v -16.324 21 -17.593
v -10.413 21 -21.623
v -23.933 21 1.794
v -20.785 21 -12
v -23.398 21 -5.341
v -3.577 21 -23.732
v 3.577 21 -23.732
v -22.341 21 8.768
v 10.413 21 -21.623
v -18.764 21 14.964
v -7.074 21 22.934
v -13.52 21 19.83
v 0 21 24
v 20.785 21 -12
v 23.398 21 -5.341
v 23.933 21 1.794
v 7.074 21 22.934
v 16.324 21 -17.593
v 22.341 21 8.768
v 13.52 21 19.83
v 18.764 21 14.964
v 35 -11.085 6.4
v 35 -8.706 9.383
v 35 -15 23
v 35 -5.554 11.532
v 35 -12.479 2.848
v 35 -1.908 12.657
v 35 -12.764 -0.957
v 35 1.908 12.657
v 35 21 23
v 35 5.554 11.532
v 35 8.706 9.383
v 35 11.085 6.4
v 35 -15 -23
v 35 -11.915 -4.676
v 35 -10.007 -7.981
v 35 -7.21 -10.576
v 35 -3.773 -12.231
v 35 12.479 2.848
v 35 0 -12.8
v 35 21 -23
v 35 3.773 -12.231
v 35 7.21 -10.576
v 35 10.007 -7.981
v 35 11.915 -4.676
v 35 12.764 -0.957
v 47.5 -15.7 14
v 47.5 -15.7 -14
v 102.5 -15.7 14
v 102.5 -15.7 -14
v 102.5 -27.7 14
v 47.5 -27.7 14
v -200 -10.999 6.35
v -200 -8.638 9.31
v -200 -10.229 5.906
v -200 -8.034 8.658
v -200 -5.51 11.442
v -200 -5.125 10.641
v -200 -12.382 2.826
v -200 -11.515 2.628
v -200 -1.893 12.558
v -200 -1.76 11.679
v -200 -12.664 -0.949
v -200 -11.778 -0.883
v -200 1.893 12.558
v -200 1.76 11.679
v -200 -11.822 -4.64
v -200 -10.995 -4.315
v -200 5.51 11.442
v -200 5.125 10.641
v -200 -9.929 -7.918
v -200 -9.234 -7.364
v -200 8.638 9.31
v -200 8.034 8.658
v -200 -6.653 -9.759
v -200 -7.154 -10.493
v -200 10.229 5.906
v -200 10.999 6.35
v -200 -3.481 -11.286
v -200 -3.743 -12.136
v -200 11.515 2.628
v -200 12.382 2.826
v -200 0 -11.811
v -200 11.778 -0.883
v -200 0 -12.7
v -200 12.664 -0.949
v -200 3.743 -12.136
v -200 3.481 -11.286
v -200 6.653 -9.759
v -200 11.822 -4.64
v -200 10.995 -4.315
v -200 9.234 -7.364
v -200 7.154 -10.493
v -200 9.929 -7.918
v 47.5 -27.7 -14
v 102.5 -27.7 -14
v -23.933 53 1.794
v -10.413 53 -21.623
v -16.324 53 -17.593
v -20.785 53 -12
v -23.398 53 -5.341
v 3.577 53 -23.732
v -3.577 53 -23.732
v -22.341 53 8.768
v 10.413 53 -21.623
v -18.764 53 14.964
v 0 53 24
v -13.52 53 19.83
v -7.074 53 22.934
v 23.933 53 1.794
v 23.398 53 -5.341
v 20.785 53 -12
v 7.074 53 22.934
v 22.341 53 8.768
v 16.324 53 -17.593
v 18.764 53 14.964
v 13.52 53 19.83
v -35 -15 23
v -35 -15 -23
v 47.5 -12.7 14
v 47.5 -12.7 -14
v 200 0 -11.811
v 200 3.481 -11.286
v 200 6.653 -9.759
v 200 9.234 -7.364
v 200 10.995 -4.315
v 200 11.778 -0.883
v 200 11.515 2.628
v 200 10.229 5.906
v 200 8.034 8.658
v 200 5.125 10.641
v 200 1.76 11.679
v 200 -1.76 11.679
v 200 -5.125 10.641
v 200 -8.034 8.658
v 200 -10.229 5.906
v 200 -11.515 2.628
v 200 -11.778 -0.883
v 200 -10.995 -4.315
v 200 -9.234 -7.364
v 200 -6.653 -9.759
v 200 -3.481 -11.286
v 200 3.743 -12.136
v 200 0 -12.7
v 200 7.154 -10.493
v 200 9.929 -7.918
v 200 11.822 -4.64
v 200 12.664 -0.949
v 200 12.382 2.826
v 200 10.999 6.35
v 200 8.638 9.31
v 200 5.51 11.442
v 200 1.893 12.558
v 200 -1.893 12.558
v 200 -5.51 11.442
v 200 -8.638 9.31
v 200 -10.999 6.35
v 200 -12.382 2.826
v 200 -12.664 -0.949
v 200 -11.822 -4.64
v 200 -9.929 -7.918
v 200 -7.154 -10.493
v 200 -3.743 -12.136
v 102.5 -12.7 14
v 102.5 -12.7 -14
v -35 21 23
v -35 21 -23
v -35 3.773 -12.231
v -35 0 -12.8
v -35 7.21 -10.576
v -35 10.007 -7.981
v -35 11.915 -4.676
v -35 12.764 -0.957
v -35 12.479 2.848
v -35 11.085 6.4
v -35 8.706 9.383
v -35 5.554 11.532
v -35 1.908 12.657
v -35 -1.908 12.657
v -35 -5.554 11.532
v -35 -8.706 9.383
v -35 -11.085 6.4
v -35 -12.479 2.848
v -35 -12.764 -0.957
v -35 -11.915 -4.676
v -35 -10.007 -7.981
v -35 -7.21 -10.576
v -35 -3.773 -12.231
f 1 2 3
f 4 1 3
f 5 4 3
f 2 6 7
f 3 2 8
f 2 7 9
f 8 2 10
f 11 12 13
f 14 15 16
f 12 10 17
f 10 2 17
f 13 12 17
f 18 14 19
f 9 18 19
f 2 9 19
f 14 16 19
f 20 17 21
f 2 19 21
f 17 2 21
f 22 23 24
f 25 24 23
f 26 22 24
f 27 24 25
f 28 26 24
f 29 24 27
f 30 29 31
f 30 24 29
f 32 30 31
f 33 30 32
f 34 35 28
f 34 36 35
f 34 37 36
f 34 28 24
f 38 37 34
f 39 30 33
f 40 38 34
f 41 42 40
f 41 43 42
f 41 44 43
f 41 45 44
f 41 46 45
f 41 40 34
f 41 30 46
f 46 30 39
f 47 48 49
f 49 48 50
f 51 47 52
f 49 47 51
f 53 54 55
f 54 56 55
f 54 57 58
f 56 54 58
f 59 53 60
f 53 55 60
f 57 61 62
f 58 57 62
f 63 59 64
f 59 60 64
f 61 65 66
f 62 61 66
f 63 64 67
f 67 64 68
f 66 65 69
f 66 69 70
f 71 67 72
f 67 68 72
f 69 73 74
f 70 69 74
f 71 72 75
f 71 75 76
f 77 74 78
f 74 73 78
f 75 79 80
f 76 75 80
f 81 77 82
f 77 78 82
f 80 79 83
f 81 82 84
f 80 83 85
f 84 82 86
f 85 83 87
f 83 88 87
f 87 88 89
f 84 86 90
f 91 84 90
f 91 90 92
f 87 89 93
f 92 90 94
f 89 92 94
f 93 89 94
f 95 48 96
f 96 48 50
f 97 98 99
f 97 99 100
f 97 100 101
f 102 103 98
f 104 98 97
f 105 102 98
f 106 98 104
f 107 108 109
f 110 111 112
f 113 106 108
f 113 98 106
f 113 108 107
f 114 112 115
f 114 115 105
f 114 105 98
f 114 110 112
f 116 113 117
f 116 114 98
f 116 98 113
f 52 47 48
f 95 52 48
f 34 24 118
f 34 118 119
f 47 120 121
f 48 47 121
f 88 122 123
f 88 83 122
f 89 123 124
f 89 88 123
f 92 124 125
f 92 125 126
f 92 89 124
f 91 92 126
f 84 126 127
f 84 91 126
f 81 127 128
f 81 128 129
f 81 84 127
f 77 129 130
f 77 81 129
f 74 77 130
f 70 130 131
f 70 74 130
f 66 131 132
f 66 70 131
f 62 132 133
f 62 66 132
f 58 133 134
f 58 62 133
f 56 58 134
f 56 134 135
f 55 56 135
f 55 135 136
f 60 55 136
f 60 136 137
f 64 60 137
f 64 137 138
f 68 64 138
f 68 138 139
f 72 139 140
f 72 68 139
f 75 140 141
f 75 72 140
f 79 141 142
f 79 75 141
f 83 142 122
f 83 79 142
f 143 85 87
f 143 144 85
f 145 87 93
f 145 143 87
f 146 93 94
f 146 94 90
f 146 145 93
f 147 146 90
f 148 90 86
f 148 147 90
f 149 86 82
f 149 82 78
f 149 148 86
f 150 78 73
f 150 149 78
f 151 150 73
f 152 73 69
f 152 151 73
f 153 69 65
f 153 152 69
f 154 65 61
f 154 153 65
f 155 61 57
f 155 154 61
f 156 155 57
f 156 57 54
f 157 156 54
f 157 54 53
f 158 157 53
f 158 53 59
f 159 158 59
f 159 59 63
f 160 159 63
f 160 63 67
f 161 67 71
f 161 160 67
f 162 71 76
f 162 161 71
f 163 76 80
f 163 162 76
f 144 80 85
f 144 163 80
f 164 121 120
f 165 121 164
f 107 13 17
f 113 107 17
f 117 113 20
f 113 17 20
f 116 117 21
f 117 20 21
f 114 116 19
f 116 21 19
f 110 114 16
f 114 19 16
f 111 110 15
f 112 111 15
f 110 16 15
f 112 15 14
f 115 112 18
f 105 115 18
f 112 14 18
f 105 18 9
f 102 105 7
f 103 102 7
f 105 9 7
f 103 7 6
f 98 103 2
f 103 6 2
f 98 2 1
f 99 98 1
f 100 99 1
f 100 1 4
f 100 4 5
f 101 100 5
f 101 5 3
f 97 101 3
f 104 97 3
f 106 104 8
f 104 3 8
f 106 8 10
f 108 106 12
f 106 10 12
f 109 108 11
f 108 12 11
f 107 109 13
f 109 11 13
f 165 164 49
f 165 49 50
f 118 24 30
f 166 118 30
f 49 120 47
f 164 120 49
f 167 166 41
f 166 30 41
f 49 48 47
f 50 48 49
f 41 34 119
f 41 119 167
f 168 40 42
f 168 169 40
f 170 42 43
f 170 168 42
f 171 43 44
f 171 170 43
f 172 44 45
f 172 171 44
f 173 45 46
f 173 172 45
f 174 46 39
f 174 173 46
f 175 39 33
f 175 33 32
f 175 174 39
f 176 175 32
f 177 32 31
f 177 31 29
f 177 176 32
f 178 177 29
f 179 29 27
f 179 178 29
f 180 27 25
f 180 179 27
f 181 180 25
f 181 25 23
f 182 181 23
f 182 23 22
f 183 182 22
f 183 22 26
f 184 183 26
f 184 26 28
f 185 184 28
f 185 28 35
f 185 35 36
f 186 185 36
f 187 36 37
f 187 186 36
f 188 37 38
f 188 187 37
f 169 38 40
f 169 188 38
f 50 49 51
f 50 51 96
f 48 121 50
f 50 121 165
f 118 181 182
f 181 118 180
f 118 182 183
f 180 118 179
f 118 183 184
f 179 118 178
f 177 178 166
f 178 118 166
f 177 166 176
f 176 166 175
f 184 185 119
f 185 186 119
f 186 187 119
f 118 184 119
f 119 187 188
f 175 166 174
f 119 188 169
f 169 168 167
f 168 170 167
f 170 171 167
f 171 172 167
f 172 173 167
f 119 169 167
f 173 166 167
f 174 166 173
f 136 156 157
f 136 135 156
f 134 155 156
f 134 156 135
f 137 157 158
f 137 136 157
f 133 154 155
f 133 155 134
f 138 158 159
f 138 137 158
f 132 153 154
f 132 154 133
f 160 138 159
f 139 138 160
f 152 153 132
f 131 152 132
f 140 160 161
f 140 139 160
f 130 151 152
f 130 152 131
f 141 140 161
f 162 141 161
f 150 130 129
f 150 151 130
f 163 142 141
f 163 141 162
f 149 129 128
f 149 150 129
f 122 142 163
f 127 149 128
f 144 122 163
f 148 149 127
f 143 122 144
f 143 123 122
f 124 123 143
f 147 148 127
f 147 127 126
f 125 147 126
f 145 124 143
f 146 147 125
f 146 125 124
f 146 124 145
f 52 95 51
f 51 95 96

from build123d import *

# Parameters (mm, degrees)
SKETCH1_R   = 12.7
SKETCH1_R_2 = 11.811
BOOM_DEPTH  = 200
SKETCH2_W   = 46
SKETCH2_H   = 36
SKETCH2_R   = 12.8
MOUNT_DEPTH = 35
MOTOR_START = 21
SKETCH3_R   = 24
MOTOR_DEPTH = 32
PAD_START   = -12.7
SKETCH4_W   = 55
SKETCH4_H   = 28
PAD_DEPTH   = 3
ESC_START   = -15.7
SKETCH5_W   = 55
SKETCH5_H   = 28
ESC_DEPTH   = 12


with BuildPart() as part:
    # Sketch1 → Boom (new, symmetric)
    with BuildSketch(Plane(origin=(0, 0, 0), x_dir=(0, 0, -1), z_dir=(1, 0, 0))):
        Circle(SKETCH1_R)
        Circle(SKETCH1_R_2, mode=Mode.SUBTRACT)
    extrude(amount=BOOM_DEPTH, both=True)


with BuildPart() as body_2:
    # Sketch2 → Mount (new, symmetric)
    with BuildSketch(Plane(origin=(0, 0, 0), x_dir=(0, 0, -1), z_dir=(1, 0, 0))):
        with Locations((0, 3)):
            Rectangle(SKETCH2_W, SKETCH2_H)
        Circle(SKETCH2_R, mode=Mode.SUBTRACT)
    extrude(amount=MOUNT_DEPTH, both=True)


with BuildPart() as body_3:
    # Sketch3 → Motor (new body)
    with BuildSketch(Plane(origin=(0, 0, 0), x_dir=(1, 0, 0), z_dir=(0, 1, 0)).offset(MOTOR_START)):
        with Locations(Location((0, 0, 0), (0, 0, 270))):
            Circle(SKETCH3_R)
    extrude(amount=MOTOR_DEPTH)


with BuildPart() as body_4:
    # Sketch4 → Pad (new body)
    with BuildSketch(Plane(origin=(0, 0, 0), x_dir=(1, 0, 0), z_dir=(0, 1, 0)).offset(PAD_START)):
        with Locations((75, 0)):
            Rectangle(SKETCH4_W, SKETCH4_H)
    extrude(amount=-PAD_DEPTH)


with BuildPart() as body_5:
    # Sketch5 → ESC (new body)
    with BuildSketch(Plane(origin=(0, 0, 0), x_dir=(1, 0, 0), z_dir=(0, 1, 0)).offset(ESC_START)):
        with Locations((75, 0)):
            Rectangle(SKETCH5_W, SKETCH5_H)
    extrude(amount=-ESC_DEPTH)


solid = Compound([part.part, body_2.part, body_3.part, body_4.part, body_5.part])
